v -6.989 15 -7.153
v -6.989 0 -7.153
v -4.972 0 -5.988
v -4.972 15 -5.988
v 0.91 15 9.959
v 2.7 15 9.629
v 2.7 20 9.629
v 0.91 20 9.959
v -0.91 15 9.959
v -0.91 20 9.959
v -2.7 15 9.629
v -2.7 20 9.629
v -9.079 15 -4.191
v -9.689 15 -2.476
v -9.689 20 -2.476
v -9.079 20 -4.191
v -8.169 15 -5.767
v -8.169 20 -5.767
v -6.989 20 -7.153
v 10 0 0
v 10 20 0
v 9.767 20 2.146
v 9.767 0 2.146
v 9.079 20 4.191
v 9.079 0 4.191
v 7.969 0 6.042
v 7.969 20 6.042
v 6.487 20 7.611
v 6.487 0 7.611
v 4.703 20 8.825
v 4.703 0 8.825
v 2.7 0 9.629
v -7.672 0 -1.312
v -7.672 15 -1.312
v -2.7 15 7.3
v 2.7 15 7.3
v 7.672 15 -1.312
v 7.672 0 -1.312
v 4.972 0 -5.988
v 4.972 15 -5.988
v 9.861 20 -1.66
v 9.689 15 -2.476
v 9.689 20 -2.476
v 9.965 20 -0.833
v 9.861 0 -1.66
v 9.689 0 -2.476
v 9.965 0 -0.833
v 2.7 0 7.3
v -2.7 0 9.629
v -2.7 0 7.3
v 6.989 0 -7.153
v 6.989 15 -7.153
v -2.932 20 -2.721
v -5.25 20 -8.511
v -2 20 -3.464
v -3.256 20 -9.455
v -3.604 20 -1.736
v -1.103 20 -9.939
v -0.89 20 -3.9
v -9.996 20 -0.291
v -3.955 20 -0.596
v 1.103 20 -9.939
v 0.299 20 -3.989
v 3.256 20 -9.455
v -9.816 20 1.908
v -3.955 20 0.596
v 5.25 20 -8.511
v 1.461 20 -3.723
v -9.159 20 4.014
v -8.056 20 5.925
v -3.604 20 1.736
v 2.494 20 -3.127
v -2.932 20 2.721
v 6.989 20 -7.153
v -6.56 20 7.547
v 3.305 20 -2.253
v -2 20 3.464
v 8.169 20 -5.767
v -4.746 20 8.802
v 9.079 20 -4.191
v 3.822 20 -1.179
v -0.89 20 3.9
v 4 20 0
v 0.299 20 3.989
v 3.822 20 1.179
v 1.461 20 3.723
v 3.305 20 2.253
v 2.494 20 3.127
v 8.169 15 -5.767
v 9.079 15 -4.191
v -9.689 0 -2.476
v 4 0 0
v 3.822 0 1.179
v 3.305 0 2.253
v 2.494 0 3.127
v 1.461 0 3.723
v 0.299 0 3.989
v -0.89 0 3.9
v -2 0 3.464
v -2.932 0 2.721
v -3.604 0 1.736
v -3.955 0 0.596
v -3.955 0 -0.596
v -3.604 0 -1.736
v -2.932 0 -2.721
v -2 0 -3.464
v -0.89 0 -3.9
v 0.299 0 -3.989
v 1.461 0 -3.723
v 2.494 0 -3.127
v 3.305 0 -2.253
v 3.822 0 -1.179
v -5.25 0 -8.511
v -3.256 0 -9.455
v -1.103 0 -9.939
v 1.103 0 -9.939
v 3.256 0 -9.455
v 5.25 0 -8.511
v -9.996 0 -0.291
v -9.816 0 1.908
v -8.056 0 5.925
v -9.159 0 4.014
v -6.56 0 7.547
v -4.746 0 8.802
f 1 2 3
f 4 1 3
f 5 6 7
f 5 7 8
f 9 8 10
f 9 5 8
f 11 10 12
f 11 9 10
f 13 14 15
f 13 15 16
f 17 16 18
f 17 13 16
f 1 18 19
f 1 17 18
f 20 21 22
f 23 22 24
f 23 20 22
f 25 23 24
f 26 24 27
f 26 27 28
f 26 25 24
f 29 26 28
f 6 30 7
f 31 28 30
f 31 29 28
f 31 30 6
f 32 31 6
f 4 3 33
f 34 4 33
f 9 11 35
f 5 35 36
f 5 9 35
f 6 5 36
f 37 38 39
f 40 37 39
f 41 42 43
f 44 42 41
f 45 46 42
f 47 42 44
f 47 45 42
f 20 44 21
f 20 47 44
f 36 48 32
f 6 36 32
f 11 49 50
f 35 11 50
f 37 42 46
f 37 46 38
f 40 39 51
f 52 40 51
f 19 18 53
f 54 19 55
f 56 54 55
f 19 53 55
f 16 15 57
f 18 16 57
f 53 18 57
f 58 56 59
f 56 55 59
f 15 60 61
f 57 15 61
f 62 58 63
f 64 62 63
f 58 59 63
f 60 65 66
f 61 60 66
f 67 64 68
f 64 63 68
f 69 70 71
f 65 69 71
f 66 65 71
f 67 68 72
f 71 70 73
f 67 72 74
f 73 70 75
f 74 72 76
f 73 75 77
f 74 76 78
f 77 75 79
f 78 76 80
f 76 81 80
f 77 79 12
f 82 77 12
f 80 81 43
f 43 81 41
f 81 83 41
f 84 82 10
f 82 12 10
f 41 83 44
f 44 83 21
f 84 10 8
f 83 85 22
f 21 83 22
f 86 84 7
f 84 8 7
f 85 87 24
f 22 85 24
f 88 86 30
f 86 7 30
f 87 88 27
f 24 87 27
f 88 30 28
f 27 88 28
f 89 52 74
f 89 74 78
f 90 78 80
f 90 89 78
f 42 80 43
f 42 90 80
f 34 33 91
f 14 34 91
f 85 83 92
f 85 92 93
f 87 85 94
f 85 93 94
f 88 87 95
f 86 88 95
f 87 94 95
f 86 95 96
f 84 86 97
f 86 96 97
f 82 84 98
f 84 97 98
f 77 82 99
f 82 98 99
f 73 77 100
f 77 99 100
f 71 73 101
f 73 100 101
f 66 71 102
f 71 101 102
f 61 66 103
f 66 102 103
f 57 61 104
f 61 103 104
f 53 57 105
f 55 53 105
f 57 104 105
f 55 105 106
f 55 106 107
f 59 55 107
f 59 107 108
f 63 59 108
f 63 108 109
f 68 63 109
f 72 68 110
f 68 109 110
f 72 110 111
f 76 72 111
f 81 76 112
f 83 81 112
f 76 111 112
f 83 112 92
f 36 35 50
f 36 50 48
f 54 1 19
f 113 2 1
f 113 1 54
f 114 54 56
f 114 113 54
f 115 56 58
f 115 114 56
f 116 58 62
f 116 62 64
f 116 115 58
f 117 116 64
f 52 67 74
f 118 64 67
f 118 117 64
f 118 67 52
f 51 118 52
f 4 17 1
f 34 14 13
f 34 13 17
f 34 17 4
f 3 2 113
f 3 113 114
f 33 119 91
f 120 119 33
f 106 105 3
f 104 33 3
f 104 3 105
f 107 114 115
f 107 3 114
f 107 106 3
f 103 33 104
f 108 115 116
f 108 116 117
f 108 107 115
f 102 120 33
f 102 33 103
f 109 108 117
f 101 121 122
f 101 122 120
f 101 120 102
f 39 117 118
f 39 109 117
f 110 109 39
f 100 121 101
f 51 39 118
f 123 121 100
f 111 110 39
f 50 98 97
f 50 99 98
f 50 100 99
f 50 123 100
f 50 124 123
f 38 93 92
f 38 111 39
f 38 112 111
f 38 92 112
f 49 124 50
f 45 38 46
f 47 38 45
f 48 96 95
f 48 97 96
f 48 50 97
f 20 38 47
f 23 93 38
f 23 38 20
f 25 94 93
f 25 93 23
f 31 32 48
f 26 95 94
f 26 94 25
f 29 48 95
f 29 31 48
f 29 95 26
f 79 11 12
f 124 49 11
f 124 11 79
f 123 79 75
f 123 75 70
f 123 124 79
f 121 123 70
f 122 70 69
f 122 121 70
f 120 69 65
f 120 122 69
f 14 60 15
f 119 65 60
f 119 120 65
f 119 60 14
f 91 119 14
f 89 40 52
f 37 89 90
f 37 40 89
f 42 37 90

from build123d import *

# Parameters (mm, degrees)
F0_R     = 4
F1_DEPTH = 20
F2_DEPTH = 15


with BuildPart() as f1:
    # F0 (on Front) → F1 (new body)
    with BuildSketch(Plane.XZ):
        with BuildLine():
            ThreePointArc((9.688615, -2.476033), (9.921848, -1.247768), (10, 0))
            ThreePointArc((10, 0), (7.968689, 6.041523), (2.7, 9.628603))
            Line((2.7, 9.628603), (2.7, 7.3))
            Line((2.7, 7.3), (-2.7, 7.3))
            Line((-2.7, 7.3), (-2.7, 9.628603))
            ThreePointArc((-2.7, 9.628603), (-8.660254, 5), (-9.688615, -2.476033))
            Line((-9.688615, -2.476033), (-7.671985, -1.311731))
            Line((-7.671985, -1.311731), (-4.971985, -5.988269))
            Line((-4.971985, -5.988269), (-6.988615, -7.15257))
            ThreePointArc((-6.988615, -7.15257), (0, -10), (6.988615, -7.15257))
            Line((6.988615, -7.15257), (4.971985, -5.988269))
            Line((4.971985, -5.988269), (7.671985, -1.311731))
            Line((7.671985, -1.311731), (9.688615, -2.476033))
        make_face()
        Circle(F0_R, mode=Mode.SUBTRACT)
        with BuildLine():
            Line((-7.671985, -1.311731), (-9.688615, -2.476033))
            ThreePointArc((-9.688615, -2.476033), (-8.660254, -5), (-6.988615, -7.15257))
            Line((-6.988615, -7.15257), (-4.971985, -5.988269))
            Line((-4.971985, -5.988269), (-7.671985, -1.311731))
        make_face()
        with BuildLine():
            Line((2.7, 7.3), (2.7, 9.628603))
            ThreePointArc((2.7, 9.628603), (0, 10), (-2.7, 9.628603))
            Line((-2.7, 9.628603), (-2.7, 7.3))
            Line((-2.7, 7.3), (2.7, 7.3))
        make_face()
        with BuildLine():
            ThreePointArc((6.988615, -7.15257), (8.660254, -5), (9.688615, -2.476033))
            Line((9.688615, -2.476033), (7.671985, -1.311731))
            Line((7.671985, -1.311731), (4.971985, -5.988269))
            Line((4.971985, -5.988269), (6.988615, -7.15257))
        make_face()
    extrude(amount=-F1_DEPTH)

    # F0 (on Front) → F2 (cut)
    with BuildSketch(Plane.XZ):
        with BuildLine():
            Line((-7.671985, -1.311731), (-9.688615, -2.476033))
            ThreePointArc((-9.688615, -2.476033), (-8.660254, -5), (-6.988615, -7.15257))
            Line((-6.988615, -7.15257), (-4.971985, -5.988269))
            Line((-4.971985, -5.988269), (-7.671985, -1.311731))
        make_face()
        with BuildLine():
            Line((2.7, 7.3), (2.7, 9.628603))
            ThreePointArc((2.7, 9.628603), (0, 10), (-2.7, 9.628603))
            Line((-2.7, 9.628603), (-2.7, 7.3))
            Line((-2.7, 7.3), (2.7, 7.3))
        make_face()
        with BuildLine():
            ThreePointArc((6.988615, -7.15257), (8.660254, -5), (9.688615, -2.476033))
            Line((9.688615, -2.476033), (7.671985, -1.311731))
            Line((7.671985, -1.311731), (4.971985, -5.988269))
            Line((4.971985, -5.988269), (6.988615, -7.15257))
        make_face()
    extrude(amount=-F2_DEPTH, mode=Mode.SUBTRACT)


solid = f1.part
